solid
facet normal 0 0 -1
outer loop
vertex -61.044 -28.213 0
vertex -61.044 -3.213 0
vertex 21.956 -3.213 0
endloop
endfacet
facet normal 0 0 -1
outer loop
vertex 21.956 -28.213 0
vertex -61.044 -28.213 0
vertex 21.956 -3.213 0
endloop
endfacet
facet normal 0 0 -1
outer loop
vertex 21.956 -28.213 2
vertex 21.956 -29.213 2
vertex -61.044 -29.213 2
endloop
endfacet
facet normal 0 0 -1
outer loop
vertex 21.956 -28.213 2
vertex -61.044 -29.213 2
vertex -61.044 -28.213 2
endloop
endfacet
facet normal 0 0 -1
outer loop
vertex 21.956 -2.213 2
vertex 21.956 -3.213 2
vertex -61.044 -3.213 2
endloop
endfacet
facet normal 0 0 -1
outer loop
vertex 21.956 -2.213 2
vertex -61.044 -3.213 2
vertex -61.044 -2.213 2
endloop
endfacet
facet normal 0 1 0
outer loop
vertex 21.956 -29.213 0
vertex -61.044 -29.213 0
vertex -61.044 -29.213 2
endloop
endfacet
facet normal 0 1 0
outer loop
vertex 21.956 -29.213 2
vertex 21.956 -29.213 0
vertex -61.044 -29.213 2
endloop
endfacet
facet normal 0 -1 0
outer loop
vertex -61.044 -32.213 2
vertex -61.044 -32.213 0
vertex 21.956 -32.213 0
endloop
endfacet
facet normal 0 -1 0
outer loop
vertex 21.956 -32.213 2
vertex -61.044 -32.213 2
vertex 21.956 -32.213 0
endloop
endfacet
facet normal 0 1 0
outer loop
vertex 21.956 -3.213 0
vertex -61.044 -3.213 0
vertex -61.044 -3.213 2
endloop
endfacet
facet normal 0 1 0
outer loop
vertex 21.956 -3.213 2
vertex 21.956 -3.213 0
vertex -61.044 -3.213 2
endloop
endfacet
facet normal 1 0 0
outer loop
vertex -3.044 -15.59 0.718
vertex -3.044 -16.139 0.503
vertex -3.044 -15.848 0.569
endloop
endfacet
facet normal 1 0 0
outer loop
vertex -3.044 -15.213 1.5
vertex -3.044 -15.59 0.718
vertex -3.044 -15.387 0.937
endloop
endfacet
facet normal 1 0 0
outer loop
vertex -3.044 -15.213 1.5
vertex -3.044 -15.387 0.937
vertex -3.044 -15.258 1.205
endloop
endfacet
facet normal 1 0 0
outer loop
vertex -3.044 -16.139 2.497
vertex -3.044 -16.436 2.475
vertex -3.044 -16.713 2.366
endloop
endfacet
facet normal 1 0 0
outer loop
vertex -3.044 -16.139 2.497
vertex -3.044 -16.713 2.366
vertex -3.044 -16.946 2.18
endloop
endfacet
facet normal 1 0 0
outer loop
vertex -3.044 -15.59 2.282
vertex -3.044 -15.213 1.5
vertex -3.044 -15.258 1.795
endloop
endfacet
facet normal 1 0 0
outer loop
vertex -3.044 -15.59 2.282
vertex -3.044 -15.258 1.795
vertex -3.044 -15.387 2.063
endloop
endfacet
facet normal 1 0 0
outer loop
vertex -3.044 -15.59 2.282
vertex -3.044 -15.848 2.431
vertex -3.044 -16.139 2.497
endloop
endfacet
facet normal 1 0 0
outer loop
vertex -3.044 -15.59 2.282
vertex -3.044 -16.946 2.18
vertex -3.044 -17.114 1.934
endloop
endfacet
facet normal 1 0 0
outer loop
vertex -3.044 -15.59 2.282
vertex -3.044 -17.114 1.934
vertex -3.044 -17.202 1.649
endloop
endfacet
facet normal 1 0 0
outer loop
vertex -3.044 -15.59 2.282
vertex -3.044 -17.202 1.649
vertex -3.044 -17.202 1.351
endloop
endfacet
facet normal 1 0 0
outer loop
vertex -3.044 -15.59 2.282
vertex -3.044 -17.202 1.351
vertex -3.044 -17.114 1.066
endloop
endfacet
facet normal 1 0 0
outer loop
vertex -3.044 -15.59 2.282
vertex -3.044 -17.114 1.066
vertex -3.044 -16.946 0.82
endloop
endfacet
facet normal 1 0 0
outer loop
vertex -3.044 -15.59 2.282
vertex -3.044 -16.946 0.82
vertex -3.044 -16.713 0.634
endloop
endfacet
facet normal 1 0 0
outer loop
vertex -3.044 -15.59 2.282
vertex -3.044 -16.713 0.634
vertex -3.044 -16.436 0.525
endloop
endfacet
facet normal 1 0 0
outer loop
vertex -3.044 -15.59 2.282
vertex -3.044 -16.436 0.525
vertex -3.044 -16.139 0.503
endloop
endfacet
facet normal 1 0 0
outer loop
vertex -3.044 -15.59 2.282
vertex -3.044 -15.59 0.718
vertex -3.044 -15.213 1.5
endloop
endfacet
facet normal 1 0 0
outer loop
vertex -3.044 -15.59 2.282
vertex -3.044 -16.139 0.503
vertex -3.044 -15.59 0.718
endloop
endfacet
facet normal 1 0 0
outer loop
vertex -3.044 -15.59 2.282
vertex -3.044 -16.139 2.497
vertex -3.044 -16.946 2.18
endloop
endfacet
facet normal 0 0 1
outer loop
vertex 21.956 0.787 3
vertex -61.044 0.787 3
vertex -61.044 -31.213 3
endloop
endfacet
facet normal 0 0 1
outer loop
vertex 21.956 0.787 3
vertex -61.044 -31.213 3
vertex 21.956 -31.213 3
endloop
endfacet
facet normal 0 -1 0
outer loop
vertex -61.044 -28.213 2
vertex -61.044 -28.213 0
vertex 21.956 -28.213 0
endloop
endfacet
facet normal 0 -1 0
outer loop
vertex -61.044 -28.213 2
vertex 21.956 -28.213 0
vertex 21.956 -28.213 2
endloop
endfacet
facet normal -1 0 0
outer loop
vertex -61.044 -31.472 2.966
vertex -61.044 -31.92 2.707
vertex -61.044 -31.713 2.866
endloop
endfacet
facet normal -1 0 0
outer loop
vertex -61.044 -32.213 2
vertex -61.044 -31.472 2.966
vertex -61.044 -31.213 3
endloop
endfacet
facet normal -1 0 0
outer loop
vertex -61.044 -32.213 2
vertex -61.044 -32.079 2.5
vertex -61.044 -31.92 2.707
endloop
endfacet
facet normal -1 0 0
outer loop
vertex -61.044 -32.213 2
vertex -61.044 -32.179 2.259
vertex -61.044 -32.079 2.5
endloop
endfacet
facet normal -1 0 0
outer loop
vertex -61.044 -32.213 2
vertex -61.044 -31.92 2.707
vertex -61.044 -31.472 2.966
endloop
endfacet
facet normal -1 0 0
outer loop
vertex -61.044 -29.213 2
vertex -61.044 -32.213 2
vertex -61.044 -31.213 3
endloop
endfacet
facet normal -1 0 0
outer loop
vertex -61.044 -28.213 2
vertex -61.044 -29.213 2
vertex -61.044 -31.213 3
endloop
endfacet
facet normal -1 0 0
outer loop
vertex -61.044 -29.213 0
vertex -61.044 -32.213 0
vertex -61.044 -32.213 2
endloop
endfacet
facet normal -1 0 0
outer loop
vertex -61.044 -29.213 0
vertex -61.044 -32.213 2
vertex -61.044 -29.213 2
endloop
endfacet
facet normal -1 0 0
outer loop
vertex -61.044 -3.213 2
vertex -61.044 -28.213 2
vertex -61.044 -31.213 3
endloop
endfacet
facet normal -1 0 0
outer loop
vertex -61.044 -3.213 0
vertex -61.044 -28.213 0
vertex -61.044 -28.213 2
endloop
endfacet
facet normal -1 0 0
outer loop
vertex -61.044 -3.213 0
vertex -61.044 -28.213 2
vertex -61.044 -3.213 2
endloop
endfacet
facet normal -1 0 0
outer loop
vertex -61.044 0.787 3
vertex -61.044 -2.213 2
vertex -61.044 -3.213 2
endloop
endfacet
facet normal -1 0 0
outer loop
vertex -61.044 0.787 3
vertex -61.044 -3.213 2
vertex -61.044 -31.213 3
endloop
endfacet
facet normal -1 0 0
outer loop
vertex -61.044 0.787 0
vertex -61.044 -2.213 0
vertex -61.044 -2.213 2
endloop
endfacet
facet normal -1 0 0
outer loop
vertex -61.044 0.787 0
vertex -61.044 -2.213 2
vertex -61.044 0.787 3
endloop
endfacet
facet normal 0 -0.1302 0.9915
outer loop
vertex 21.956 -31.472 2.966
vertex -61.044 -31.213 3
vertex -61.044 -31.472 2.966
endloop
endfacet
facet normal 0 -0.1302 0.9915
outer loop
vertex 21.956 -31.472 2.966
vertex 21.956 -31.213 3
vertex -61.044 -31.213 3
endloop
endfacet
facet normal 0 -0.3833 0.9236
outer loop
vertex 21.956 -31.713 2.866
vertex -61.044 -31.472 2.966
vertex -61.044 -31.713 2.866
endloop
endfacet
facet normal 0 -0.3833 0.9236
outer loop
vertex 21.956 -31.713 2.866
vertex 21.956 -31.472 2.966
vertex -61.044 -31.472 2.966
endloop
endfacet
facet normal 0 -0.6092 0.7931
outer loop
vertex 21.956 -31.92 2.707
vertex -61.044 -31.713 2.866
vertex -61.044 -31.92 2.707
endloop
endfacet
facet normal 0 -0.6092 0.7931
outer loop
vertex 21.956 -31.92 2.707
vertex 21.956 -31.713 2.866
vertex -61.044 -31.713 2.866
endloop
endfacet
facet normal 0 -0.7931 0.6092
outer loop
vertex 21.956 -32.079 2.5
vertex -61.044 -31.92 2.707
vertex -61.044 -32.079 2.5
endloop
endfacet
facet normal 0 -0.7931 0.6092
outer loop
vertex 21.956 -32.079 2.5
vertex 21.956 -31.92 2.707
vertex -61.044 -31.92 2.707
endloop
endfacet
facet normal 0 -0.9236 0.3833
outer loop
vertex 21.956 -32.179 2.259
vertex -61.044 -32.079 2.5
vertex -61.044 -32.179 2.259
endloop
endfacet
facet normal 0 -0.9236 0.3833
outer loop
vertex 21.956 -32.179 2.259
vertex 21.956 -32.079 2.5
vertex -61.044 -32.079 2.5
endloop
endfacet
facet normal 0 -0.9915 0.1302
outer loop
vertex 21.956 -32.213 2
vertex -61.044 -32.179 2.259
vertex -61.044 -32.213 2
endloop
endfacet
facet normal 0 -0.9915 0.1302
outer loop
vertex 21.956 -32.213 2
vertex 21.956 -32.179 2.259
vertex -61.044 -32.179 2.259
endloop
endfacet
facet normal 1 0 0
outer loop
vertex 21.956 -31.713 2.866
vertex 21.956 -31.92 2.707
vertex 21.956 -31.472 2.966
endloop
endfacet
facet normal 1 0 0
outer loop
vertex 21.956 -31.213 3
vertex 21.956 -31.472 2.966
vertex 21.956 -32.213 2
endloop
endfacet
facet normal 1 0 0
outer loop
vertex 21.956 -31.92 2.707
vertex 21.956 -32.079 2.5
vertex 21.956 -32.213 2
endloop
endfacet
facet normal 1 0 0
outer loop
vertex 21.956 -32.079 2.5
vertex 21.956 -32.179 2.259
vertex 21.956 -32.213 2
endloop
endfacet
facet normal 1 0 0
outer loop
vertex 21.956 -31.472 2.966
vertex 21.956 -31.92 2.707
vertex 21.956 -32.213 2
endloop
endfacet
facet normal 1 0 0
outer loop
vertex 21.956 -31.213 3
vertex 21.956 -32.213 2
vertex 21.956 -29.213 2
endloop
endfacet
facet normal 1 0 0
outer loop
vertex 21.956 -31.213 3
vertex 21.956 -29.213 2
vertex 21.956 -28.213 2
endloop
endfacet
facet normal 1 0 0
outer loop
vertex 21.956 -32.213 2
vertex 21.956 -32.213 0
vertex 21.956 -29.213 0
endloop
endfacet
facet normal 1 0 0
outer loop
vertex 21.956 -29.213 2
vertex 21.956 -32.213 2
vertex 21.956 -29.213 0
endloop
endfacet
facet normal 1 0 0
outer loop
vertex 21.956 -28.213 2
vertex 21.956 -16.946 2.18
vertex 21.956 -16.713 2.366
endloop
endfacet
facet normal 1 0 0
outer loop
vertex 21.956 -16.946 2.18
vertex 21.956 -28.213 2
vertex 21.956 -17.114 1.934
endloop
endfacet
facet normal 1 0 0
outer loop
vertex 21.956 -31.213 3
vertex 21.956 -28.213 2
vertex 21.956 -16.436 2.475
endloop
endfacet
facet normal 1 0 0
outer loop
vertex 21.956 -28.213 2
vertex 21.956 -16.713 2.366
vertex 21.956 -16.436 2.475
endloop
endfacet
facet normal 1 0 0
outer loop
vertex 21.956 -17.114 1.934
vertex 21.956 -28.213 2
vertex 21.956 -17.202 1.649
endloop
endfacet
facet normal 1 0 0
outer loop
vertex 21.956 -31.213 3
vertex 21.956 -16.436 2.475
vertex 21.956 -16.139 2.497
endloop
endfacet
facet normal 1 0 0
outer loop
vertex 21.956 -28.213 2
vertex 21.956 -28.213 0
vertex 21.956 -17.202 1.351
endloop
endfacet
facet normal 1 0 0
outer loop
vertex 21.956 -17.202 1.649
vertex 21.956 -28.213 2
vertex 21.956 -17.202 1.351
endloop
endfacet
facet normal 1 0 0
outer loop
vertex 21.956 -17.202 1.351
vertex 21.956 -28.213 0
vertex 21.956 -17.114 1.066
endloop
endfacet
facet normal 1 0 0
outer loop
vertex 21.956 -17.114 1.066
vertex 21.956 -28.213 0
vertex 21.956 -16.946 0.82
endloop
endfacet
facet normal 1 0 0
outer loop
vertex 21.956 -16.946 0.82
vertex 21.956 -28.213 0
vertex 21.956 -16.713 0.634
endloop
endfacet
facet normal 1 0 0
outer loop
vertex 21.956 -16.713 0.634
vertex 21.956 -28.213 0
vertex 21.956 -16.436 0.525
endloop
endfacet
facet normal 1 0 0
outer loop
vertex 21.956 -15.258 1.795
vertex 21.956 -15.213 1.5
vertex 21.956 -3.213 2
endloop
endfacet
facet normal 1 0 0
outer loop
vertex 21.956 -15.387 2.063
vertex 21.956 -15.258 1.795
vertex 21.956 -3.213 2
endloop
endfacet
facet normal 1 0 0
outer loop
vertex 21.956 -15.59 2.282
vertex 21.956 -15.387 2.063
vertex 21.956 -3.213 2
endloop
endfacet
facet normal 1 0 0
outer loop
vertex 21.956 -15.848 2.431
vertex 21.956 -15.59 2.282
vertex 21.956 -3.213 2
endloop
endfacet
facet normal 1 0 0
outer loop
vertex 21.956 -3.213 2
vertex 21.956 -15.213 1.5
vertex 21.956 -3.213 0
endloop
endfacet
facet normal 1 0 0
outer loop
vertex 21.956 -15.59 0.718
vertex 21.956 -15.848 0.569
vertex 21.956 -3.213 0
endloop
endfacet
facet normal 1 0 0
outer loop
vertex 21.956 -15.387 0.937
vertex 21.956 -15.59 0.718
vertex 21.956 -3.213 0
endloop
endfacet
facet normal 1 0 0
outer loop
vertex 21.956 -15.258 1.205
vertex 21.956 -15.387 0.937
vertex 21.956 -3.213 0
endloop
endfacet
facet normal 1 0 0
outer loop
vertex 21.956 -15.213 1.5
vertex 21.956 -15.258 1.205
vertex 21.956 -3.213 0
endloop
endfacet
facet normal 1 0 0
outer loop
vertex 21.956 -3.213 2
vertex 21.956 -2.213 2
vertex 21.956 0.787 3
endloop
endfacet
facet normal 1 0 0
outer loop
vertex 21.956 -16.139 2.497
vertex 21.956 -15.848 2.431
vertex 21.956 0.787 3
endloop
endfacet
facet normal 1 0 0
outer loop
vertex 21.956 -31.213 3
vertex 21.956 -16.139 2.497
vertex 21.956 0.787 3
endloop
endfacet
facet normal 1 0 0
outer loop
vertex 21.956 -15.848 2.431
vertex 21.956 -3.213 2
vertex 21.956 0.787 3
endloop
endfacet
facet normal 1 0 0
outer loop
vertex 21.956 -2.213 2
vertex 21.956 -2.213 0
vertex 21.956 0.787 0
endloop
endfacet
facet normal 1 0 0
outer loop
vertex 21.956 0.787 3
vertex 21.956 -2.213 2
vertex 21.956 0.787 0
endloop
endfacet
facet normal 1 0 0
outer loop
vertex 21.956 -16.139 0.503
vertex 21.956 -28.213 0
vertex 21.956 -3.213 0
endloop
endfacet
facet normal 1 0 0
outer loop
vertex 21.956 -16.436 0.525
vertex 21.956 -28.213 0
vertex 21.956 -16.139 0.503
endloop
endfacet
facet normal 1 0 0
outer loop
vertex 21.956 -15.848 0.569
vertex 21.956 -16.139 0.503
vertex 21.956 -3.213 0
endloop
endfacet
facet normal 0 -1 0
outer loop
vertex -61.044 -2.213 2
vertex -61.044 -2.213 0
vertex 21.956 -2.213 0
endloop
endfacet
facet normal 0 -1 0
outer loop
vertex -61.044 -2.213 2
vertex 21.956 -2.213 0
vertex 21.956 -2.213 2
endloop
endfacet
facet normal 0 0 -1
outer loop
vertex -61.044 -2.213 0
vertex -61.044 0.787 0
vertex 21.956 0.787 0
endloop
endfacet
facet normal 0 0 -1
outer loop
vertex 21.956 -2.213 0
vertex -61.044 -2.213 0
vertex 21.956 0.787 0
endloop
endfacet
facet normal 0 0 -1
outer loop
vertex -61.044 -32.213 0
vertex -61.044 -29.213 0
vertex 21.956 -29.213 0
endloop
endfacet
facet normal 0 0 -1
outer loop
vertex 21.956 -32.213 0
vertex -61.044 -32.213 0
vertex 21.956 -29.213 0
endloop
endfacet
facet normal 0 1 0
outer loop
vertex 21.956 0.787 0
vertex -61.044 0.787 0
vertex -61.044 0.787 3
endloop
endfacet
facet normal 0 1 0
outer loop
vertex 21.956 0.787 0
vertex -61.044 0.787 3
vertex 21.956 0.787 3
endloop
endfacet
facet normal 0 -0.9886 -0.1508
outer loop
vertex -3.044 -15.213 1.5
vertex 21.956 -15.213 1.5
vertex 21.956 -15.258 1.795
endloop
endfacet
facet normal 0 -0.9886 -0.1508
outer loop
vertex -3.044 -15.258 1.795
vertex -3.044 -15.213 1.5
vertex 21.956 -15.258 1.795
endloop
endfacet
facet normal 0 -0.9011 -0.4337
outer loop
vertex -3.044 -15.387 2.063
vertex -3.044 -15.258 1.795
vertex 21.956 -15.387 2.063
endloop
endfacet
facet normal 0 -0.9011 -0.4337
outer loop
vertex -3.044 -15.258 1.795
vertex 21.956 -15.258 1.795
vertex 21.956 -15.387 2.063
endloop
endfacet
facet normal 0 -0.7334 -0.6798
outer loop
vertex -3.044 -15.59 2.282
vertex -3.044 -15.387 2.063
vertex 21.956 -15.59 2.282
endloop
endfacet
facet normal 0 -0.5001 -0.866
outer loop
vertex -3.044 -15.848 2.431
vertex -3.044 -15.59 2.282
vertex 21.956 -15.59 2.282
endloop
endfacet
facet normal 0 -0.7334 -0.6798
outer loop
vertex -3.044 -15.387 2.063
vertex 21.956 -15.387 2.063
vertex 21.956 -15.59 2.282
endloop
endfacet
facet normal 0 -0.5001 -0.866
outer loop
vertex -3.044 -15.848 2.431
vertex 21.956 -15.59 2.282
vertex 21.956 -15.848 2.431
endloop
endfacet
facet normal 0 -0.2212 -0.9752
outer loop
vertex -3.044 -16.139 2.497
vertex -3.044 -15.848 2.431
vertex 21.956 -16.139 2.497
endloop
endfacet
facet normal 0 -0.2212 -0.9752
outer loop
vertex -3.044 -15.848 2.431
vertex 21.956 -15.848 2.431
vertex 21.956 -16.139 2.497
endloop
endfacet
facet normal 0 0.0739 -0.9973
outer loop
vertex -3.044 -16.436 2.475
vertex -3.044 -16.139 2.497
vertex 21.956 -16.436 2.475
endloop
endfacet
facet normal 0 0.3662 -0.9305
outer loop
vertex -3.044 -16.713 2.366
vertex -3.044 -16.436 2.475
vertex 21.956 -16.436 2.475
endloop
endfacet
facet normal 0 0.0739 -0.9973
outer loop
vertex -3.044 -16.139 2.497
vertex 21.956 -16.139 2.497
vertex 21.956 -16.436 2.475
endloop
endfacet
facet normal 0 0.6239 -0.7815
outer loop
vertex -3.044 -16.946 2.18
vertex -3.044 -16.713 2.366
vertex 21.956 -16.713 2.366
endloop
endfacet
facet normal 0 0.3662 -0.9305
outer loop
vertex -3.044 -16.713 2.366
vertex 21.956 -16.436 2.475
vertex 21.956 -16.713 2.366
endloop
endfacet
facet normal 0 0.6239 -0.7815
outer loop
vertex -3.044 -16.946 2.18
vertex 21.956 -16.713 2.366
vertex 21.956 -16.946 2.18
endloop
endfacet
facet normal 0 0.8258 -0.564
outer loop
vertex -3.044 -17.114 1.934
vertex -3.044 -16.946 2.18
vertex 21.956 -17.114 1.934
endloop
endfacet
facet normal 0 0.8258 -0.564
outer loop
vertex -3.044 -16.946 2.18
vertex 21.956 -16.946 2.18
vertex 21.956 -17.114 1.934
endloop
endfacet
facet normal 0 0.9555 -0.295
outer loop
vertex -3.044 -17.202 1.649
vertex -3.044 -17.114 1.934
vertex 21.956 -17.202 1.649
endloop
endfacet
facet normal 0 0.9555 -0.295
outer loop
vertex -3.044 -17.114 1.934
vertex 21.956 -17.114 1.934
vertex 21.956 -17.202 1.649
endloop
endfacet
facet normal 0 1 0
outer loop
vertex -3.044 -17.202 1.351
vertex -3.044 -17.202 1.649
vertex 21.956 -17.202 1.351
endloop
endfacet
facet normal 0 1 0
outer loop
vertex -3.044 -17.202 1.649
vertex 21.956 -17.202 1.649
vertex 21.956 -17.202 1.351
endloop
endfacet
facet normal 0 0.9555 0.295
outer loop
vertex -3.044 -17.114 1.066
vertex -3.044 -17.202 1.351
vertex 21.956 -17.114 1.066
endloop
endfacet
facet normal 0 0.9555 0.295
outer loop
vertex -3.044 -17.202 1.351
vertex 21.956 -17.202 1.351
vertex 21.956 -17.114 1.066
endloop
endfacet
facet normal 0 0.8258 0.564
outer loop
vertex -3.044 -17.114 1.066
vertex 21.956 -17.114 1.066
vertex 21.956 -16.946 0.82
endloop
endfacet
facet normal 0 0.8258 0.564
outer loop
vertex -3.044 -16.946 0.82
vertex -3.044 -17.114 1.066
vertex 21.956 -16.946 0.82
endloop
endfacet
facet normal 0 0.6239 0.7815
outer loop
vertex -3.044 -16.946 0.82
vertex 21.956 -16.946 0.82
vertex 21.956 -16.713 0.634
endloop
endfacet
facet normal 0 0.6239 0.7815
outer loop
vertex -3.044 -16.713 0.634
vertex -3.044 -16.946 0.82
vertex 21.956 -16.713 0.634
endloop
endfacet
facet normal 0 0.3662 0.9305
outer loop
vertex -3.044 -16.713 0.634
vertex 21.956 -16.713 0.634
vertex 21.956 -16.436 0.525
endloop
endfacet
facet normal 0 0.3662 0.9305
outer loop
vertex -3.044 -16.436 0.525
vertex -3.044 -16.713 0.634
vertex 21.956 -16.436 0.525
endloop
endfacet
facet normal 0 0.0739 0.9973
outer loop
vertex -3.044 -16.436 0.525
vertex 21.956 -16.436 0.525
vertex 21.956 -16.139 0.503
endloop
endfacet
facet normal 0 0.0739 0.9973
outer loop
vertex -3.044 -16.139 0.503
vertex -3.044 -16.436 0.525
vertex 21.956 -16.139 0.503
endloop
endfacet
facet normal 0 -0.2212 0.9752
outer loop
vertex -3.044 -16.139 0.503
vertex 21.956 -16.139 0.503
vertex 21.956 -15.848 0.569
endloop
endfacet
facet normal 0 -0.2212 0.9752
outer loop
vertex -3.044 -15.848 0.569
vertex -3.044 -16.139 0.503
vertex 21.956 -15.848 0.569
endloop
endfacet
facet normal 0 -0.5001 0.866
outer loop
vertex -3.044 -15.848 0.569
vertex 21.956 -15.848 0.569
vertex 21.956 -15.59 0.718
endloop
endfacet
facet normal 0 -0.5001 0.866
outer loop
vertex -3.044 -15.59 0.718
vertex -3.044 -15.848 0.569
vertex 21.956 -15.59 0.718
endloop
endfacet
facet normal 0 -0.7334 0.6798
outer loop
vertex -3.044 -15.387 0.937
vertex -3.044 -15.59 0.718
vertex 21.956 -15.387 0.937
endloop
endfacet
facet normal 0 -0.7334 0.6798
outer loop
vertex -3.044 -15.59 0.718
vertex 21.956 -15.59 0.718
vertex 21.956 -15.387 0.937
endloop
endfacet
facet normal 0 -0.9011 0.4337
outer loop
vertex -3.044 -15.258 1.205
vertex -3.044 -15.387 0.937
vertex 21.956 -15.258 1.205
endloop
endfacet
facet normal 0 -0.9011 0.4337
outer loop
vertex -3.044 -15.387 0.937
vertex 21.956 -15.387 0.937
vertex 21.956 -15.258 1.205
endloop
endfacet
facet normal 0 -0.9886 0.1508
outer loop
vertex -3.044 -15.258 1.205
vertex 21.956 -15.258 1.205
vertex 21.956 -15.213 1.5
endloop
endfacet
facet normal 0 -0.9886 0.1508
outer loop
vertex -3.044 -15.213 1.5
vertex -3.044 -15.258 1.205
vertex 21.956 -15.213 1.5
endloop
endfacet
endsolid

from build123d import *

# Parameters (mm, degrees)
F0_W     = 83
F0_H     = 33
F1_DEPTH = 3
F2_W     = 1
F2_H     = 2
F3_DEPTH = 83.001
F4_W     = 2.98905
F4_H     = 25
F5_DEPTH = 2
F6_R     = 1
F7_DEPTH = 25
F8_R     = 1


with BuildPart() as f1:
    # F0 (on Top) → F1 (new body)
    with BuildSketch(Plane.XY):
        with Locations((-19.543798, -15.713293)):
            Rectangle(F0_W, F0_H)
    extrude(amount=F1_DEPTH)

    # F2 (on face) → F3 (cut, through all)
    with BuildSketch(Plane.YZ.offset(21.956202)):
        with Locations((-28.713293, 1)):
            Rectangle(F2_W, F2_H)
        with Locations((-2.713293, 1)):
            Rectangle(F2_W, F2_H)
    extrude(amount=-F3_DEPTH, mode=Mode.SUBTRACT)

    # F4 (on face) → F5 (join)
    with BuildSketch(Plane(origin=(0, 0, 0), x_dir=(1, 0, 0), z_dir=(0, 0, -1))):
        with Locations((-45.065695, 15.713293)):
            Rectangle(F4_W, F4_H)
    extrude(amount=-F5_DEPTH)

    # F6 (on face) → F7 (cut)
    with BuildSketch(Plane.YZ.offset(21.956202)):
        with Locations((-16.213293, 1.5)):
            Circle(F6_R)
    extrude(amount=-F7_DEPTH, mode=Mode.SUBTRACT)

    # F8
    f8_edges = [f1.edges().sort_by_distance(p)[0] for p in [
        (-19.543798, -32.213293, 3),
    ]]
    fillet(f8_edges, radius=F8_R)


solid = f1.part
